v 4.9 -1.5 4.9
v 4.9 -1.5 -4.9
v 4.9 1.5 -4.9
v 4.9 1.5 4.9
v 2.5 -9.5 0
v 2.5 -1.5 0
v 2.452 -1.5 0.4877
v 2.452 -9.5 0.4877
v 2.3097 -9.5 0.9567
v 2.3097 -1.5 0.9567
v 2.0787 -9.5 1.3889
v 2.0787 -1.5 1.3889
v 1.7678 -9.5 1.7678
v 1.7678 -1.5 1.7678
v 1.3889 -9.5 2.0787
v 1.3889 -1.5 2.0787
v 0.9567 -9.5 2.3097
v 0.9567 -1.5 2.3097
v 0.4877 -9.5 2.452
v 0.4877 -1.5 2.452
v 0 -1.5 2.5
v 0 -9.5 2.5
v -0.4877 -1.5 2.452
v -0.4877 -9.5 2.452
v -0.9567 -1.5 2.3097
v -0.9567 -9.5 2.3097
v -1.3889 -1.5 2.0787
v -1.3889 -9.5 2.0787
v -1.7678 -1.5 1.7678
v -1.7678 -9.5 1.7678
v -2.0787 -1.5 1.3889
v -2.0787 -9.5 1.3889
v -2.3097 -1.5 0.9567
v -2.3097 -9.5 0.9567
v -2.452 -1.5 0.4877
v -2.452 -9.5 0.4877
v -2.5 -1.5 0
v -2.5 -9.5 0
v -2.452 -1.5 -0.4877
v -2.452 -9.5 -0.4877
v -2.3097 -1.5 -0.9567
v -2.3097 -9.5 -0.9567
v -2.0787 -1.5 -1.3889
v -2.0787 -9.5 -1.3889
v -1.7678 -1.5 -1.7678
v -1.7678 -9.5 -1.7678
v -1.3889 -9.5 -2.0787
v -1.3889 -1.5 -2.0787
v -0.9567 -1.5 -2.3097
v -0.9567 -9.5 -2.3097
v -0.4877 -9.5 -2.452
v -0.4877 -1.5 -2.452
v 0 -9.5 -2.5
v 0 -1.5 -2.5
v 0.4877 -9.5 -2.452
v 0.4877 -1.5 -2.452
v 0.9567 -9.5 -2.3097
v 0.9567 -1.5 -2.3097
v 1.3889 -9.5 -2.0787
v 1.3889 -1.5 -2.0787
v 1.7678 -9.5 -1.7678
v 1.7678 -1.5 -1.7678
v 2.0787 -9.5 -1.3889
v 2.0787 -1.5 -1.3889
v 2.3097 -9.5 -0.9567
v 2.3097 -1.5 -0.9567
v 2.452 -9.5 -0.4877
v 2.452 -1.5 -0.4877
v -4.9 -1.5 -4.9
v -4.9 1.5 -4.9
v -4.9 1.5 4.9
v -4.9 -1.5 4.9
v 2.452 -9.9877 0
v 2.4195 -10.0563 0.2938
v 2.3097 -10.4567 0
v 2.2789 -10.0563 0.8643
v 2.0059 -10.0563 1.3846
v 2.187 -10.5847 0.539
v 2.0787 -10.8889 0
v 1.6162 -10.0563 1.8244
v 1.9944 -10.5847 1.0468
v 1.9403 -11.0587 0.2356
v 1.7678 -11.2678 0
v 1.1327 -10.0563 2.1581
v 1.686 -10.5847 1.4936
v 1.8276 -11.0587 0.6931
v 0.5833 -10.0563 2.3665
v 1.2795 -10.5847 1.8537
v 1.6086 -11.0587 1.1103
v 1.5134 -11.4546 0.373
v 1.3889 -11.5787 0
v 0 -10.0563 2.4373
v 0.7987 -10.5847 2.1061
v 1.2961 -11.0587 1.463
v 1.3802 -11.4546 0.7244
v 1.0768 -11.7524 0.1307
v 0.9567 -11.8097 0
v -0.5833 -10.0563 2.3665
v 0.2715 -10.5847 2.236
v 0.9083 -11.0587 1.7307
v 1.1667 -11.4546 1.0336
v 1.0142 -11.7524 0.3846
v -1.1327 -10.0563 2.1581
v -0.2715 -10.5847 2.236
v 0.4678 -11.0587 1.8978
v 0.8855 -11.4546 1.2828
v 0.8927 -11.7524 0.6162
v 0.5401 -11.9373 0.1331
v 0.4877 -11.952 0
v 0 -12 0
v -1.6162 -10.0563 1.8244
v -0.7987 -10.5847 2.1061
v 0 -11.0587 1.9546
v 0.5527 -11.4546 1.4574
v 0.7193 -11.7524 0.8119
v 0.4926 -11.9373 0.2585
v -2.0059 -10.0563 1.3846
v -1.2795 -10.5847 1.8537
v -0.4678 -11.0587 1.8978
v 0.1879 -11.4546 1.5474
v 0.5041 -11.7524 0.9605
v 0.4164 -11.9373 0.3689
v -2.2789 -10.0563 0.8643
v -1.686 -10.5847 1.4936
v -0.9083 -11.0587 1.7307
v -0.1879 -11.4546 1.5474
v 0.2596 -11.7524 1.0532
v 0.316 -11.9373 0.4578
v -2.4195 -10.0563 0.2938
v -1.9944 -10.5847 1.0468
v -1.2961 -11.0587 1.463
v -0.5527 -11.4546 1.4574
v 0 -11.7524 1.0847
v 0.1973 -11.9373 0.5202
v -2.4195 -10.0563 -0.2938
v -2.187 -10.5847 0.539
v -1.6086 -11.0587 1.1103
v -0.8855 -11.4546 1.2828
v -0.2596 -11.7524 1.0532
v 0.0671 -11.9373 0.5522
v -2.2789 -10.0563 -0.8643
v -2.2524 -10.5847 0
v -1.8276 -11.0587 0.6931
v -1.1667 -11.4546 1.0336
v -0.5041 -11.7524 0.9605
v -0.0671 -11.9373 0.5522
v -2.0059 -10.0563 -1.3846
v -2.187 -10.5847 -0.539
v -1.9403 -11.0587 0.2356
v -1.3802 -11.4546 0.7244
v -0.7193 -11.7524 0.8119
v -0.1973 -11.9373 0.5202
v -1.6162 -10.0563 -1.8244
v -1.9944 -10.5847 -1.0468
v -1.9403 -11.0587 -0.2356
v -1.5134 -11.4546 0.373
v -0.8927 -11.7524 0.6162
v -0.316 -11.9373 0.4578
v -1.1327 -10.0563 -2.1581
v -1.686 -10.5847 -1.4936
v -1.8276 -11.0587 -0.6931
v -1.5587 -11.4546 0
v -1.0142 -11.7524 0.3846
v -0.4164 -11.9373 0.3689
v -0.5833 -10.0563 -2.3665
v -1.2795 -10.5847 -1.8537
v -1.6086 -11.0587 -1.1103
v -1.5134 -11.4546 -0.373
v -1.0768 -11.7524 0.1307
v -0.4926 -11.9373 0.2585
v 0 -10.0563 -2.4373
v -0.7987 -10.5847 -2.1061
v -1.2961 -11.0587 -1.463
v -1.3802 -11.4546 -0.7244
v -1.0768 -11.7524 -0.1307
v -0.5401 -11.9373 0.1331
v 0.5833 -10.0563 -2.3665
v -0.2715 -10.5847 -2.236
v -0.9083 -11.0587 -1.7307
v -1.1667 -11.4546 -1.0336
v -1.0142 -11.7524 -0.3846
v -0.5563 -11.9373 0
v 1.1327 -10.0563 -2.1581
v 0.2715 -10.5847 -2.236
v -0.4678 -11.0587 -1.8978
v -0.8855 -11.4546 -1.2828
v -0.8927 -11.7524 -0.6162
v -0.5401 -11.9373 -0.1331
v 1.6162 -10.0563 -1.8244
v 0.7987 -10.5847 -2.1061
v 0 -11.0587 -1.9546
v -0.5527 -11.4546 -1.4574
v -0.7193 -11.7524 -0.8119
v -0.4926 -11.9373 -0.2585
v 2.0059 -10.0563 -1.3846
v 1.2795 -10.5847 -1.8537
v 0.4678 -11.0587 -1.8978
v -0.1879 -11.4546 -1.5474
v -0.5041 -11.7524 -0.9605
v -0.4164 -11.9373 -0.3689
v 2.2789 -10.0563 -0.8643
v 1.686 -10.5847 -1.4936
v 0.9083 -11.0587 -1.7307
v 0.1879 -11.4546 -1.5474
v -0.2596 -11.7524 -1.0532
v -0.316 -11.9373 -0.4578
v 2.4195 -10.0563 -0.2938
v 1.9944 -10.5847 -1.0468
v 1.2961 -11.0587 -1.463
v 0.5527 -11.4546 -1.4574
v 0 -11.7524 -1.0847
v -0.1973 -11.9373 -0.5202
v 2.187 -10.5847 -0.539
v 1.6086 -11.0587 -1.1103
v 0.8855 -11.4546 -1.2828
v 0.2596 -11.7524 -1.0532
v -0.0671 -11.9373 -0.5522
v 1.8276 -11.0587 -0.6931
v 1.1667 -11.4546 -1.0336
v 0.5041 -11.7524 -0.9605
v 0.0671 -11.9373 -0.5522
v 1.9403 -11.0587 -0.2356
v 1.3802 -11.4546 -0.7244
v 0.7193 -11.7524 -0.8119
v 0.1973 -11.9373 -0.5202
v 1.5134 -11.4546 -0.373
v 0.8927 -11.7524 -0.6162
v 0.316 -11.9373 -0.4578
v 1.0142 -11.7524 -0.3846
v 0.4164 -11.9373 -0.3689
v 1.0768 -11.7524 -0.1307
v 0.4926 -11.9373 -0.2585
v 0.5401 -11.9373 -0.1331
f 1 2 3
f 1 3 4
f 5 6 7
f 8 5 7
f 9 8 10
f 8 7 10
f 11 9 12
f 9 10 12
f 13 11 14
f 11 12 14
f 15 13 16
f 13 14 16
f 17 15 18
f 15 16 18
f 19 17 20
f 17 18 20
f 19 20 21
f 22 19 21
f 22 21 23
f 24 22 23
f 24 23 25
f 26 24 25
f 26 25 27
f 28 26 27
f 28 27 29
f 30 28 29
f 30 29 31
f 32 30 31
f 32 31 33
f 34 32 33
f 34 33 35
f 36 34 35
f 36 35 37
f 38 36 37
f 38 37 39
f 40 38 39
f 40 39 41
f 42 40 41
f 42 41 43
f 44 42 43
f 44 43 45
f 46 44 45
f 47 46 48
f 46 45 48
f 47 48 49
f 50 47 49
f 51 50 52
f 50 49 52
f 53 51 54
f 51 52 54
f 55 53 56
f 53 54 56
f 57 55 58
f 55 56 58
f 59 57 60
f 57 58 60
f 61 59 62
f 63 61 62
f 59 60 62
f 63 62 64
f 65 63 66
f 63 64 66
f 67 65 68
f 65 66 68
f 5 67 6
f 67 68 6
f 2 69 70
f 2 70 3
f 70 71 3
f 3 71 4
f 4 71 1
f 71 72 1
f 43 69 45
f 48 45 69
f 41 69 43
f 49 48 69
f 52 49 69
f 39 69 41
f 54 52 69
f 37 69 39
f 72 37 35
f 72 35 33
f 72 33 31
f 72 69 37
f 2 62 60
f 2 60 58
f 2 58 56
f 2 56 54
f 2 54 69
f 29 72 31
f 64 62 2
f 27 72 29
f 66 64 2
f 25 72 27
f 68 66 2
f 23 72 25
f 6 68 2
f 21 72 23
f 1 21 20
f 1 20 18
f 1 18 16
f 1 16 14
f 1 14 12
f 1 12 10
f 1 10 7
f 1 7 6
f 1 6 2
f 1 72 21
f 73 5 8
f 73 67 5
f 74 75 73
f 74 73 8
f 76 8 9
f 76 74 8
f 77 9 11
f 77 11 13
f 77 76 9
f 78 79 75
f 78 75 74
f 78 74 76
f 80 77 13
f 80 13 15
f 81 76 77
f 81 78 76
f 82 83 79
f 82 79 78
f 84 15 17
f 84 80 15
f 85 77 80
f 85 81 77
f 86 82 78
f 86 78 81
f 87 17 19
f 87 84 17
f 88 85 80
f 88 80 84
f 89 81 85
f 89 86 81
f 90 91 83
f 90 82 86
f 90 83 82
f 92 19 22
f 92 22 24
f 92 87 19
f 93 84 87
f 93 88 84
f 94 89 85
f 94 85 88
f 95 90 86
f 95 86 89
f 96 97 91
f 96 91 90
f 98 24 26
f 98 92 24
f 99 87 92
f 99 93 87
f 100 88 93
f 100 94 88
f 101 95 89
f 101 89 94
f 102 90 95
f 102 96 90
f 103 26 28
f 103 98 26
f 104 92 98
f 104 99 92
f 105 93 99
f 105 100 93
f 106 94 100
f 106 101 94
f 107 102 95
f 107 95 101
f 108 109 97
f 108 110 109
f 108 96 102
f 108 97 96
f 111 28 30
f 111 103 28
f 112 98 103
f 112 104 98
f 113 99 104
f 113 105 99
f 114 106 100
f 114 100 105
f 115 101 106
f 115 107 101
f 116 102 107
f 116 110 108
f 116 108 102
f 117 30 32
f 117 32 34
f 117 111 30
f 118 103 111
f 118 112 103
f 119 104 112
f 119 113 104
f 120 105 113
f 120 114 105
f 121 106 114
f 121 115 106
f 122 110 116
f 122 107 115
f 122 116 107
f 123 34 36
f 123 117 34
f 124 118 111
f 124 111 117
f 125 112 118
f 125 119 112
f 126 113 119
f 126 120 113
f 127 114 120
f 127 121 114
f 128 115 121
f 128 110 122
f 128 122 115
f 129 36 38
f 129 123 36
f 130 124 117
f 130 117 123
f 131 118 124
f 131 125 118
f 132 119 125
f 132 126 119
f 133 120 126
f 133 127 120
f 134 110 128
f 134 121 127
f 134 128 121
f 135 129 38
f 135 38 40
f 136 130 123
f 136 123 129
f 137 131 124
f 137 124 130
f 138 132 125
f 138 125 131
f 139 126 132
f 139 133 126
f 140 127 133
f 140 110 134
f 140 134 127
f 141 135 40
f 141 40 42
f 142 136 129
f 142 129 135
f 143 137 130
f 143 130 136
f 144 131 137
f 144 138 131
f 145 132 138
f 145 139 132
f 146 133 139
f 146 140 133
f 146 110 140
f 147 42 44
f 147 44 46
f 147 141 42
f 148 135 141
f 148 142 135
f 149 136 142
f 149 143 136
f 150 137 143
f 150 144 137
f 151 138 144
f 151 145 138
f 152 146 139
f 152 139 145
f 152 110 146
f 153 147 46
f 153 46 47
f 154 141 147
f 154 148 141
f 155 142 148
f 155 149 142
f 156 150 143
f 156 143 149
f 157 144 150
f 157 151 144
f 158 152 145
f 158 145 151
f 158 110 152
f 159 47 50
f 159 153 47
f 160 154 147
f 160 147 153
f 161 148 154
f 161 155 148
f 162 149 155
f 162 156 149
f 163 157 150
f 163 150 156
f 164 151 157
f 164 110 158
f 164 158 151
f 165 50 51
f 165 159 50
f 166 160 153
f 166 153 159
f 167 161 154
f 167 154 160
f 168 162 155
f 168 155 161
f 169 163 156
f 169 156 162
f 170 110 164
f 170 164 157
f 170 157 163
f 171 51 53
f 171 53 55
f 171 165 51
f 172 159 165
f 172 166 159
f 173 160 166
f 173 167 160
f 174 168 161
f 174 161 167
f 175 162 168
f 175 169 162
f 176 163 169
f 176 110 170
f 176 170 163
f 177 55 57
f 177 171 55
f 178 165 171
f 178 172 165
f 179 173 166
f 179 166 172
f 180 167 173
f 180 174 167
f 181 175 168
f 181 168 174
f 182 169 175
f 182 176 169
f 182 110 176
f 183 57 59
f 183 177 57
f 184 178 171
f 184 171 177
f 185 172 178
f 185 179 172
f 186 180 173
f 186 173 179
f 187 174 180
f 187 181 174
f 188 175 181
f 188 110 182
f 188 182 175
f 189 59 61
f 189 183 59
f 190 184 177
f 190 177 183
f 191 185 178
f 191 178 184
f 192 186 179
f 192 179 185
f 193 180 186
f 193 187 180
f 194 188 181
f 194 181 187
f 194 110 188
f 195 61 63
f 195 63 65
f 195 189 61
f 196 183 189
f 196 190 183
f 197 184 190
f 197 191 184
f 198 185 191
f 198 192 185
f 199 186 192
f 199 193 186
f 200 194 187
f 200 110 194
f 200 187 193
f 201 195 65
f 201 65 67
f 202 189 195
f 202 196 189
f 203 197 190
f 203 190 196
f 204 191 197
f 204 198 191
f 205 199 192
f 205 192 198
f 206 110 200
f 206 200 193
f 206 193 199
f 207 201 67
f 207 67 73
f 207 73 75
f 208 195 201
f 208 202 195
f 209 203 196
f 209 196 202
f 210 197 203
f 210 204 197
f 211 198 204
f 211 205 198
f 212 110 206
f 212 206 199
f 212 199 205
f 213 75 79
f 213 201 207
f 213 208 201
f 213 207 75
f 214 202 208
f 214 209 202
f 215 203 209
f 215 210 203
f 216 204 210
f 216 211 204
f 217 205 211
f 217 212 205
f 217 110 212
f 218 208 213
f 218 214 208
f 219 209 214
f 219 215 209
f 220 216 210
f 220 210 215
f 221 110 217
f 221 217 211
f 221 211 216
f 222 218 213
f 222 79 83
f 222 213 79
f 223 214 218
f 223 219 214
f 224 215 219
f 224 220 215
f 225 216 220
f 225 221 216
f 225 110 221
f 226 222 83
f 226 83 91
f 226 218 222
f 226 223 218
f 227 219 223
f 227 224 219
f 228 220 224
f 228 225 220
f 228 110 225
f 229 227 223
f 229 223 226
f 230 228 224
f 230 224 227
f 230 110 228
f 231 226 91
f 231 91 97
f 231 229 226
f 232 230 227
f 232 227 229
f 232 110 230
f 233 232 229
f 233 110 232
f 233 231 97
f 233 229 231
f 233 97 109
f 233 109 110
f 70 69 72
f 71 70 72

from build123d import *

# Parameters (mm, degrees)
F0_W     = 9.8
F0_H     = 9.8
F0_R     = 2.5
F1_DEPTH = 1.5
F2_DEPTH = 12
F3_R     = 2.5


with BuildPart() as f1:
    # F0 (on Front) → F1 (new body, symmetric)
    with BuildSketch(Plane.XZ):
        Rectangle(F0_W, F0_H)
        Circle(F0_R, mode=Mode.SUBTRACT)
        Circle(F0_R)
    extrude(amount=F1_DEPTH, both=True)

    # F0 (on Front) → F2 (join)
    with BuildSketch(Plane.XZ):
        Circle(F0_R)
    extrude(amount=F2_DEPTH)

    # F3
    f3_edges = [f1.edges().sort_by_distance(p)[0] for p in [
        (-2.5, -12, 0),
    ]]
    fillet(f3_edges, radius=F3_R)


solid = f1.part
